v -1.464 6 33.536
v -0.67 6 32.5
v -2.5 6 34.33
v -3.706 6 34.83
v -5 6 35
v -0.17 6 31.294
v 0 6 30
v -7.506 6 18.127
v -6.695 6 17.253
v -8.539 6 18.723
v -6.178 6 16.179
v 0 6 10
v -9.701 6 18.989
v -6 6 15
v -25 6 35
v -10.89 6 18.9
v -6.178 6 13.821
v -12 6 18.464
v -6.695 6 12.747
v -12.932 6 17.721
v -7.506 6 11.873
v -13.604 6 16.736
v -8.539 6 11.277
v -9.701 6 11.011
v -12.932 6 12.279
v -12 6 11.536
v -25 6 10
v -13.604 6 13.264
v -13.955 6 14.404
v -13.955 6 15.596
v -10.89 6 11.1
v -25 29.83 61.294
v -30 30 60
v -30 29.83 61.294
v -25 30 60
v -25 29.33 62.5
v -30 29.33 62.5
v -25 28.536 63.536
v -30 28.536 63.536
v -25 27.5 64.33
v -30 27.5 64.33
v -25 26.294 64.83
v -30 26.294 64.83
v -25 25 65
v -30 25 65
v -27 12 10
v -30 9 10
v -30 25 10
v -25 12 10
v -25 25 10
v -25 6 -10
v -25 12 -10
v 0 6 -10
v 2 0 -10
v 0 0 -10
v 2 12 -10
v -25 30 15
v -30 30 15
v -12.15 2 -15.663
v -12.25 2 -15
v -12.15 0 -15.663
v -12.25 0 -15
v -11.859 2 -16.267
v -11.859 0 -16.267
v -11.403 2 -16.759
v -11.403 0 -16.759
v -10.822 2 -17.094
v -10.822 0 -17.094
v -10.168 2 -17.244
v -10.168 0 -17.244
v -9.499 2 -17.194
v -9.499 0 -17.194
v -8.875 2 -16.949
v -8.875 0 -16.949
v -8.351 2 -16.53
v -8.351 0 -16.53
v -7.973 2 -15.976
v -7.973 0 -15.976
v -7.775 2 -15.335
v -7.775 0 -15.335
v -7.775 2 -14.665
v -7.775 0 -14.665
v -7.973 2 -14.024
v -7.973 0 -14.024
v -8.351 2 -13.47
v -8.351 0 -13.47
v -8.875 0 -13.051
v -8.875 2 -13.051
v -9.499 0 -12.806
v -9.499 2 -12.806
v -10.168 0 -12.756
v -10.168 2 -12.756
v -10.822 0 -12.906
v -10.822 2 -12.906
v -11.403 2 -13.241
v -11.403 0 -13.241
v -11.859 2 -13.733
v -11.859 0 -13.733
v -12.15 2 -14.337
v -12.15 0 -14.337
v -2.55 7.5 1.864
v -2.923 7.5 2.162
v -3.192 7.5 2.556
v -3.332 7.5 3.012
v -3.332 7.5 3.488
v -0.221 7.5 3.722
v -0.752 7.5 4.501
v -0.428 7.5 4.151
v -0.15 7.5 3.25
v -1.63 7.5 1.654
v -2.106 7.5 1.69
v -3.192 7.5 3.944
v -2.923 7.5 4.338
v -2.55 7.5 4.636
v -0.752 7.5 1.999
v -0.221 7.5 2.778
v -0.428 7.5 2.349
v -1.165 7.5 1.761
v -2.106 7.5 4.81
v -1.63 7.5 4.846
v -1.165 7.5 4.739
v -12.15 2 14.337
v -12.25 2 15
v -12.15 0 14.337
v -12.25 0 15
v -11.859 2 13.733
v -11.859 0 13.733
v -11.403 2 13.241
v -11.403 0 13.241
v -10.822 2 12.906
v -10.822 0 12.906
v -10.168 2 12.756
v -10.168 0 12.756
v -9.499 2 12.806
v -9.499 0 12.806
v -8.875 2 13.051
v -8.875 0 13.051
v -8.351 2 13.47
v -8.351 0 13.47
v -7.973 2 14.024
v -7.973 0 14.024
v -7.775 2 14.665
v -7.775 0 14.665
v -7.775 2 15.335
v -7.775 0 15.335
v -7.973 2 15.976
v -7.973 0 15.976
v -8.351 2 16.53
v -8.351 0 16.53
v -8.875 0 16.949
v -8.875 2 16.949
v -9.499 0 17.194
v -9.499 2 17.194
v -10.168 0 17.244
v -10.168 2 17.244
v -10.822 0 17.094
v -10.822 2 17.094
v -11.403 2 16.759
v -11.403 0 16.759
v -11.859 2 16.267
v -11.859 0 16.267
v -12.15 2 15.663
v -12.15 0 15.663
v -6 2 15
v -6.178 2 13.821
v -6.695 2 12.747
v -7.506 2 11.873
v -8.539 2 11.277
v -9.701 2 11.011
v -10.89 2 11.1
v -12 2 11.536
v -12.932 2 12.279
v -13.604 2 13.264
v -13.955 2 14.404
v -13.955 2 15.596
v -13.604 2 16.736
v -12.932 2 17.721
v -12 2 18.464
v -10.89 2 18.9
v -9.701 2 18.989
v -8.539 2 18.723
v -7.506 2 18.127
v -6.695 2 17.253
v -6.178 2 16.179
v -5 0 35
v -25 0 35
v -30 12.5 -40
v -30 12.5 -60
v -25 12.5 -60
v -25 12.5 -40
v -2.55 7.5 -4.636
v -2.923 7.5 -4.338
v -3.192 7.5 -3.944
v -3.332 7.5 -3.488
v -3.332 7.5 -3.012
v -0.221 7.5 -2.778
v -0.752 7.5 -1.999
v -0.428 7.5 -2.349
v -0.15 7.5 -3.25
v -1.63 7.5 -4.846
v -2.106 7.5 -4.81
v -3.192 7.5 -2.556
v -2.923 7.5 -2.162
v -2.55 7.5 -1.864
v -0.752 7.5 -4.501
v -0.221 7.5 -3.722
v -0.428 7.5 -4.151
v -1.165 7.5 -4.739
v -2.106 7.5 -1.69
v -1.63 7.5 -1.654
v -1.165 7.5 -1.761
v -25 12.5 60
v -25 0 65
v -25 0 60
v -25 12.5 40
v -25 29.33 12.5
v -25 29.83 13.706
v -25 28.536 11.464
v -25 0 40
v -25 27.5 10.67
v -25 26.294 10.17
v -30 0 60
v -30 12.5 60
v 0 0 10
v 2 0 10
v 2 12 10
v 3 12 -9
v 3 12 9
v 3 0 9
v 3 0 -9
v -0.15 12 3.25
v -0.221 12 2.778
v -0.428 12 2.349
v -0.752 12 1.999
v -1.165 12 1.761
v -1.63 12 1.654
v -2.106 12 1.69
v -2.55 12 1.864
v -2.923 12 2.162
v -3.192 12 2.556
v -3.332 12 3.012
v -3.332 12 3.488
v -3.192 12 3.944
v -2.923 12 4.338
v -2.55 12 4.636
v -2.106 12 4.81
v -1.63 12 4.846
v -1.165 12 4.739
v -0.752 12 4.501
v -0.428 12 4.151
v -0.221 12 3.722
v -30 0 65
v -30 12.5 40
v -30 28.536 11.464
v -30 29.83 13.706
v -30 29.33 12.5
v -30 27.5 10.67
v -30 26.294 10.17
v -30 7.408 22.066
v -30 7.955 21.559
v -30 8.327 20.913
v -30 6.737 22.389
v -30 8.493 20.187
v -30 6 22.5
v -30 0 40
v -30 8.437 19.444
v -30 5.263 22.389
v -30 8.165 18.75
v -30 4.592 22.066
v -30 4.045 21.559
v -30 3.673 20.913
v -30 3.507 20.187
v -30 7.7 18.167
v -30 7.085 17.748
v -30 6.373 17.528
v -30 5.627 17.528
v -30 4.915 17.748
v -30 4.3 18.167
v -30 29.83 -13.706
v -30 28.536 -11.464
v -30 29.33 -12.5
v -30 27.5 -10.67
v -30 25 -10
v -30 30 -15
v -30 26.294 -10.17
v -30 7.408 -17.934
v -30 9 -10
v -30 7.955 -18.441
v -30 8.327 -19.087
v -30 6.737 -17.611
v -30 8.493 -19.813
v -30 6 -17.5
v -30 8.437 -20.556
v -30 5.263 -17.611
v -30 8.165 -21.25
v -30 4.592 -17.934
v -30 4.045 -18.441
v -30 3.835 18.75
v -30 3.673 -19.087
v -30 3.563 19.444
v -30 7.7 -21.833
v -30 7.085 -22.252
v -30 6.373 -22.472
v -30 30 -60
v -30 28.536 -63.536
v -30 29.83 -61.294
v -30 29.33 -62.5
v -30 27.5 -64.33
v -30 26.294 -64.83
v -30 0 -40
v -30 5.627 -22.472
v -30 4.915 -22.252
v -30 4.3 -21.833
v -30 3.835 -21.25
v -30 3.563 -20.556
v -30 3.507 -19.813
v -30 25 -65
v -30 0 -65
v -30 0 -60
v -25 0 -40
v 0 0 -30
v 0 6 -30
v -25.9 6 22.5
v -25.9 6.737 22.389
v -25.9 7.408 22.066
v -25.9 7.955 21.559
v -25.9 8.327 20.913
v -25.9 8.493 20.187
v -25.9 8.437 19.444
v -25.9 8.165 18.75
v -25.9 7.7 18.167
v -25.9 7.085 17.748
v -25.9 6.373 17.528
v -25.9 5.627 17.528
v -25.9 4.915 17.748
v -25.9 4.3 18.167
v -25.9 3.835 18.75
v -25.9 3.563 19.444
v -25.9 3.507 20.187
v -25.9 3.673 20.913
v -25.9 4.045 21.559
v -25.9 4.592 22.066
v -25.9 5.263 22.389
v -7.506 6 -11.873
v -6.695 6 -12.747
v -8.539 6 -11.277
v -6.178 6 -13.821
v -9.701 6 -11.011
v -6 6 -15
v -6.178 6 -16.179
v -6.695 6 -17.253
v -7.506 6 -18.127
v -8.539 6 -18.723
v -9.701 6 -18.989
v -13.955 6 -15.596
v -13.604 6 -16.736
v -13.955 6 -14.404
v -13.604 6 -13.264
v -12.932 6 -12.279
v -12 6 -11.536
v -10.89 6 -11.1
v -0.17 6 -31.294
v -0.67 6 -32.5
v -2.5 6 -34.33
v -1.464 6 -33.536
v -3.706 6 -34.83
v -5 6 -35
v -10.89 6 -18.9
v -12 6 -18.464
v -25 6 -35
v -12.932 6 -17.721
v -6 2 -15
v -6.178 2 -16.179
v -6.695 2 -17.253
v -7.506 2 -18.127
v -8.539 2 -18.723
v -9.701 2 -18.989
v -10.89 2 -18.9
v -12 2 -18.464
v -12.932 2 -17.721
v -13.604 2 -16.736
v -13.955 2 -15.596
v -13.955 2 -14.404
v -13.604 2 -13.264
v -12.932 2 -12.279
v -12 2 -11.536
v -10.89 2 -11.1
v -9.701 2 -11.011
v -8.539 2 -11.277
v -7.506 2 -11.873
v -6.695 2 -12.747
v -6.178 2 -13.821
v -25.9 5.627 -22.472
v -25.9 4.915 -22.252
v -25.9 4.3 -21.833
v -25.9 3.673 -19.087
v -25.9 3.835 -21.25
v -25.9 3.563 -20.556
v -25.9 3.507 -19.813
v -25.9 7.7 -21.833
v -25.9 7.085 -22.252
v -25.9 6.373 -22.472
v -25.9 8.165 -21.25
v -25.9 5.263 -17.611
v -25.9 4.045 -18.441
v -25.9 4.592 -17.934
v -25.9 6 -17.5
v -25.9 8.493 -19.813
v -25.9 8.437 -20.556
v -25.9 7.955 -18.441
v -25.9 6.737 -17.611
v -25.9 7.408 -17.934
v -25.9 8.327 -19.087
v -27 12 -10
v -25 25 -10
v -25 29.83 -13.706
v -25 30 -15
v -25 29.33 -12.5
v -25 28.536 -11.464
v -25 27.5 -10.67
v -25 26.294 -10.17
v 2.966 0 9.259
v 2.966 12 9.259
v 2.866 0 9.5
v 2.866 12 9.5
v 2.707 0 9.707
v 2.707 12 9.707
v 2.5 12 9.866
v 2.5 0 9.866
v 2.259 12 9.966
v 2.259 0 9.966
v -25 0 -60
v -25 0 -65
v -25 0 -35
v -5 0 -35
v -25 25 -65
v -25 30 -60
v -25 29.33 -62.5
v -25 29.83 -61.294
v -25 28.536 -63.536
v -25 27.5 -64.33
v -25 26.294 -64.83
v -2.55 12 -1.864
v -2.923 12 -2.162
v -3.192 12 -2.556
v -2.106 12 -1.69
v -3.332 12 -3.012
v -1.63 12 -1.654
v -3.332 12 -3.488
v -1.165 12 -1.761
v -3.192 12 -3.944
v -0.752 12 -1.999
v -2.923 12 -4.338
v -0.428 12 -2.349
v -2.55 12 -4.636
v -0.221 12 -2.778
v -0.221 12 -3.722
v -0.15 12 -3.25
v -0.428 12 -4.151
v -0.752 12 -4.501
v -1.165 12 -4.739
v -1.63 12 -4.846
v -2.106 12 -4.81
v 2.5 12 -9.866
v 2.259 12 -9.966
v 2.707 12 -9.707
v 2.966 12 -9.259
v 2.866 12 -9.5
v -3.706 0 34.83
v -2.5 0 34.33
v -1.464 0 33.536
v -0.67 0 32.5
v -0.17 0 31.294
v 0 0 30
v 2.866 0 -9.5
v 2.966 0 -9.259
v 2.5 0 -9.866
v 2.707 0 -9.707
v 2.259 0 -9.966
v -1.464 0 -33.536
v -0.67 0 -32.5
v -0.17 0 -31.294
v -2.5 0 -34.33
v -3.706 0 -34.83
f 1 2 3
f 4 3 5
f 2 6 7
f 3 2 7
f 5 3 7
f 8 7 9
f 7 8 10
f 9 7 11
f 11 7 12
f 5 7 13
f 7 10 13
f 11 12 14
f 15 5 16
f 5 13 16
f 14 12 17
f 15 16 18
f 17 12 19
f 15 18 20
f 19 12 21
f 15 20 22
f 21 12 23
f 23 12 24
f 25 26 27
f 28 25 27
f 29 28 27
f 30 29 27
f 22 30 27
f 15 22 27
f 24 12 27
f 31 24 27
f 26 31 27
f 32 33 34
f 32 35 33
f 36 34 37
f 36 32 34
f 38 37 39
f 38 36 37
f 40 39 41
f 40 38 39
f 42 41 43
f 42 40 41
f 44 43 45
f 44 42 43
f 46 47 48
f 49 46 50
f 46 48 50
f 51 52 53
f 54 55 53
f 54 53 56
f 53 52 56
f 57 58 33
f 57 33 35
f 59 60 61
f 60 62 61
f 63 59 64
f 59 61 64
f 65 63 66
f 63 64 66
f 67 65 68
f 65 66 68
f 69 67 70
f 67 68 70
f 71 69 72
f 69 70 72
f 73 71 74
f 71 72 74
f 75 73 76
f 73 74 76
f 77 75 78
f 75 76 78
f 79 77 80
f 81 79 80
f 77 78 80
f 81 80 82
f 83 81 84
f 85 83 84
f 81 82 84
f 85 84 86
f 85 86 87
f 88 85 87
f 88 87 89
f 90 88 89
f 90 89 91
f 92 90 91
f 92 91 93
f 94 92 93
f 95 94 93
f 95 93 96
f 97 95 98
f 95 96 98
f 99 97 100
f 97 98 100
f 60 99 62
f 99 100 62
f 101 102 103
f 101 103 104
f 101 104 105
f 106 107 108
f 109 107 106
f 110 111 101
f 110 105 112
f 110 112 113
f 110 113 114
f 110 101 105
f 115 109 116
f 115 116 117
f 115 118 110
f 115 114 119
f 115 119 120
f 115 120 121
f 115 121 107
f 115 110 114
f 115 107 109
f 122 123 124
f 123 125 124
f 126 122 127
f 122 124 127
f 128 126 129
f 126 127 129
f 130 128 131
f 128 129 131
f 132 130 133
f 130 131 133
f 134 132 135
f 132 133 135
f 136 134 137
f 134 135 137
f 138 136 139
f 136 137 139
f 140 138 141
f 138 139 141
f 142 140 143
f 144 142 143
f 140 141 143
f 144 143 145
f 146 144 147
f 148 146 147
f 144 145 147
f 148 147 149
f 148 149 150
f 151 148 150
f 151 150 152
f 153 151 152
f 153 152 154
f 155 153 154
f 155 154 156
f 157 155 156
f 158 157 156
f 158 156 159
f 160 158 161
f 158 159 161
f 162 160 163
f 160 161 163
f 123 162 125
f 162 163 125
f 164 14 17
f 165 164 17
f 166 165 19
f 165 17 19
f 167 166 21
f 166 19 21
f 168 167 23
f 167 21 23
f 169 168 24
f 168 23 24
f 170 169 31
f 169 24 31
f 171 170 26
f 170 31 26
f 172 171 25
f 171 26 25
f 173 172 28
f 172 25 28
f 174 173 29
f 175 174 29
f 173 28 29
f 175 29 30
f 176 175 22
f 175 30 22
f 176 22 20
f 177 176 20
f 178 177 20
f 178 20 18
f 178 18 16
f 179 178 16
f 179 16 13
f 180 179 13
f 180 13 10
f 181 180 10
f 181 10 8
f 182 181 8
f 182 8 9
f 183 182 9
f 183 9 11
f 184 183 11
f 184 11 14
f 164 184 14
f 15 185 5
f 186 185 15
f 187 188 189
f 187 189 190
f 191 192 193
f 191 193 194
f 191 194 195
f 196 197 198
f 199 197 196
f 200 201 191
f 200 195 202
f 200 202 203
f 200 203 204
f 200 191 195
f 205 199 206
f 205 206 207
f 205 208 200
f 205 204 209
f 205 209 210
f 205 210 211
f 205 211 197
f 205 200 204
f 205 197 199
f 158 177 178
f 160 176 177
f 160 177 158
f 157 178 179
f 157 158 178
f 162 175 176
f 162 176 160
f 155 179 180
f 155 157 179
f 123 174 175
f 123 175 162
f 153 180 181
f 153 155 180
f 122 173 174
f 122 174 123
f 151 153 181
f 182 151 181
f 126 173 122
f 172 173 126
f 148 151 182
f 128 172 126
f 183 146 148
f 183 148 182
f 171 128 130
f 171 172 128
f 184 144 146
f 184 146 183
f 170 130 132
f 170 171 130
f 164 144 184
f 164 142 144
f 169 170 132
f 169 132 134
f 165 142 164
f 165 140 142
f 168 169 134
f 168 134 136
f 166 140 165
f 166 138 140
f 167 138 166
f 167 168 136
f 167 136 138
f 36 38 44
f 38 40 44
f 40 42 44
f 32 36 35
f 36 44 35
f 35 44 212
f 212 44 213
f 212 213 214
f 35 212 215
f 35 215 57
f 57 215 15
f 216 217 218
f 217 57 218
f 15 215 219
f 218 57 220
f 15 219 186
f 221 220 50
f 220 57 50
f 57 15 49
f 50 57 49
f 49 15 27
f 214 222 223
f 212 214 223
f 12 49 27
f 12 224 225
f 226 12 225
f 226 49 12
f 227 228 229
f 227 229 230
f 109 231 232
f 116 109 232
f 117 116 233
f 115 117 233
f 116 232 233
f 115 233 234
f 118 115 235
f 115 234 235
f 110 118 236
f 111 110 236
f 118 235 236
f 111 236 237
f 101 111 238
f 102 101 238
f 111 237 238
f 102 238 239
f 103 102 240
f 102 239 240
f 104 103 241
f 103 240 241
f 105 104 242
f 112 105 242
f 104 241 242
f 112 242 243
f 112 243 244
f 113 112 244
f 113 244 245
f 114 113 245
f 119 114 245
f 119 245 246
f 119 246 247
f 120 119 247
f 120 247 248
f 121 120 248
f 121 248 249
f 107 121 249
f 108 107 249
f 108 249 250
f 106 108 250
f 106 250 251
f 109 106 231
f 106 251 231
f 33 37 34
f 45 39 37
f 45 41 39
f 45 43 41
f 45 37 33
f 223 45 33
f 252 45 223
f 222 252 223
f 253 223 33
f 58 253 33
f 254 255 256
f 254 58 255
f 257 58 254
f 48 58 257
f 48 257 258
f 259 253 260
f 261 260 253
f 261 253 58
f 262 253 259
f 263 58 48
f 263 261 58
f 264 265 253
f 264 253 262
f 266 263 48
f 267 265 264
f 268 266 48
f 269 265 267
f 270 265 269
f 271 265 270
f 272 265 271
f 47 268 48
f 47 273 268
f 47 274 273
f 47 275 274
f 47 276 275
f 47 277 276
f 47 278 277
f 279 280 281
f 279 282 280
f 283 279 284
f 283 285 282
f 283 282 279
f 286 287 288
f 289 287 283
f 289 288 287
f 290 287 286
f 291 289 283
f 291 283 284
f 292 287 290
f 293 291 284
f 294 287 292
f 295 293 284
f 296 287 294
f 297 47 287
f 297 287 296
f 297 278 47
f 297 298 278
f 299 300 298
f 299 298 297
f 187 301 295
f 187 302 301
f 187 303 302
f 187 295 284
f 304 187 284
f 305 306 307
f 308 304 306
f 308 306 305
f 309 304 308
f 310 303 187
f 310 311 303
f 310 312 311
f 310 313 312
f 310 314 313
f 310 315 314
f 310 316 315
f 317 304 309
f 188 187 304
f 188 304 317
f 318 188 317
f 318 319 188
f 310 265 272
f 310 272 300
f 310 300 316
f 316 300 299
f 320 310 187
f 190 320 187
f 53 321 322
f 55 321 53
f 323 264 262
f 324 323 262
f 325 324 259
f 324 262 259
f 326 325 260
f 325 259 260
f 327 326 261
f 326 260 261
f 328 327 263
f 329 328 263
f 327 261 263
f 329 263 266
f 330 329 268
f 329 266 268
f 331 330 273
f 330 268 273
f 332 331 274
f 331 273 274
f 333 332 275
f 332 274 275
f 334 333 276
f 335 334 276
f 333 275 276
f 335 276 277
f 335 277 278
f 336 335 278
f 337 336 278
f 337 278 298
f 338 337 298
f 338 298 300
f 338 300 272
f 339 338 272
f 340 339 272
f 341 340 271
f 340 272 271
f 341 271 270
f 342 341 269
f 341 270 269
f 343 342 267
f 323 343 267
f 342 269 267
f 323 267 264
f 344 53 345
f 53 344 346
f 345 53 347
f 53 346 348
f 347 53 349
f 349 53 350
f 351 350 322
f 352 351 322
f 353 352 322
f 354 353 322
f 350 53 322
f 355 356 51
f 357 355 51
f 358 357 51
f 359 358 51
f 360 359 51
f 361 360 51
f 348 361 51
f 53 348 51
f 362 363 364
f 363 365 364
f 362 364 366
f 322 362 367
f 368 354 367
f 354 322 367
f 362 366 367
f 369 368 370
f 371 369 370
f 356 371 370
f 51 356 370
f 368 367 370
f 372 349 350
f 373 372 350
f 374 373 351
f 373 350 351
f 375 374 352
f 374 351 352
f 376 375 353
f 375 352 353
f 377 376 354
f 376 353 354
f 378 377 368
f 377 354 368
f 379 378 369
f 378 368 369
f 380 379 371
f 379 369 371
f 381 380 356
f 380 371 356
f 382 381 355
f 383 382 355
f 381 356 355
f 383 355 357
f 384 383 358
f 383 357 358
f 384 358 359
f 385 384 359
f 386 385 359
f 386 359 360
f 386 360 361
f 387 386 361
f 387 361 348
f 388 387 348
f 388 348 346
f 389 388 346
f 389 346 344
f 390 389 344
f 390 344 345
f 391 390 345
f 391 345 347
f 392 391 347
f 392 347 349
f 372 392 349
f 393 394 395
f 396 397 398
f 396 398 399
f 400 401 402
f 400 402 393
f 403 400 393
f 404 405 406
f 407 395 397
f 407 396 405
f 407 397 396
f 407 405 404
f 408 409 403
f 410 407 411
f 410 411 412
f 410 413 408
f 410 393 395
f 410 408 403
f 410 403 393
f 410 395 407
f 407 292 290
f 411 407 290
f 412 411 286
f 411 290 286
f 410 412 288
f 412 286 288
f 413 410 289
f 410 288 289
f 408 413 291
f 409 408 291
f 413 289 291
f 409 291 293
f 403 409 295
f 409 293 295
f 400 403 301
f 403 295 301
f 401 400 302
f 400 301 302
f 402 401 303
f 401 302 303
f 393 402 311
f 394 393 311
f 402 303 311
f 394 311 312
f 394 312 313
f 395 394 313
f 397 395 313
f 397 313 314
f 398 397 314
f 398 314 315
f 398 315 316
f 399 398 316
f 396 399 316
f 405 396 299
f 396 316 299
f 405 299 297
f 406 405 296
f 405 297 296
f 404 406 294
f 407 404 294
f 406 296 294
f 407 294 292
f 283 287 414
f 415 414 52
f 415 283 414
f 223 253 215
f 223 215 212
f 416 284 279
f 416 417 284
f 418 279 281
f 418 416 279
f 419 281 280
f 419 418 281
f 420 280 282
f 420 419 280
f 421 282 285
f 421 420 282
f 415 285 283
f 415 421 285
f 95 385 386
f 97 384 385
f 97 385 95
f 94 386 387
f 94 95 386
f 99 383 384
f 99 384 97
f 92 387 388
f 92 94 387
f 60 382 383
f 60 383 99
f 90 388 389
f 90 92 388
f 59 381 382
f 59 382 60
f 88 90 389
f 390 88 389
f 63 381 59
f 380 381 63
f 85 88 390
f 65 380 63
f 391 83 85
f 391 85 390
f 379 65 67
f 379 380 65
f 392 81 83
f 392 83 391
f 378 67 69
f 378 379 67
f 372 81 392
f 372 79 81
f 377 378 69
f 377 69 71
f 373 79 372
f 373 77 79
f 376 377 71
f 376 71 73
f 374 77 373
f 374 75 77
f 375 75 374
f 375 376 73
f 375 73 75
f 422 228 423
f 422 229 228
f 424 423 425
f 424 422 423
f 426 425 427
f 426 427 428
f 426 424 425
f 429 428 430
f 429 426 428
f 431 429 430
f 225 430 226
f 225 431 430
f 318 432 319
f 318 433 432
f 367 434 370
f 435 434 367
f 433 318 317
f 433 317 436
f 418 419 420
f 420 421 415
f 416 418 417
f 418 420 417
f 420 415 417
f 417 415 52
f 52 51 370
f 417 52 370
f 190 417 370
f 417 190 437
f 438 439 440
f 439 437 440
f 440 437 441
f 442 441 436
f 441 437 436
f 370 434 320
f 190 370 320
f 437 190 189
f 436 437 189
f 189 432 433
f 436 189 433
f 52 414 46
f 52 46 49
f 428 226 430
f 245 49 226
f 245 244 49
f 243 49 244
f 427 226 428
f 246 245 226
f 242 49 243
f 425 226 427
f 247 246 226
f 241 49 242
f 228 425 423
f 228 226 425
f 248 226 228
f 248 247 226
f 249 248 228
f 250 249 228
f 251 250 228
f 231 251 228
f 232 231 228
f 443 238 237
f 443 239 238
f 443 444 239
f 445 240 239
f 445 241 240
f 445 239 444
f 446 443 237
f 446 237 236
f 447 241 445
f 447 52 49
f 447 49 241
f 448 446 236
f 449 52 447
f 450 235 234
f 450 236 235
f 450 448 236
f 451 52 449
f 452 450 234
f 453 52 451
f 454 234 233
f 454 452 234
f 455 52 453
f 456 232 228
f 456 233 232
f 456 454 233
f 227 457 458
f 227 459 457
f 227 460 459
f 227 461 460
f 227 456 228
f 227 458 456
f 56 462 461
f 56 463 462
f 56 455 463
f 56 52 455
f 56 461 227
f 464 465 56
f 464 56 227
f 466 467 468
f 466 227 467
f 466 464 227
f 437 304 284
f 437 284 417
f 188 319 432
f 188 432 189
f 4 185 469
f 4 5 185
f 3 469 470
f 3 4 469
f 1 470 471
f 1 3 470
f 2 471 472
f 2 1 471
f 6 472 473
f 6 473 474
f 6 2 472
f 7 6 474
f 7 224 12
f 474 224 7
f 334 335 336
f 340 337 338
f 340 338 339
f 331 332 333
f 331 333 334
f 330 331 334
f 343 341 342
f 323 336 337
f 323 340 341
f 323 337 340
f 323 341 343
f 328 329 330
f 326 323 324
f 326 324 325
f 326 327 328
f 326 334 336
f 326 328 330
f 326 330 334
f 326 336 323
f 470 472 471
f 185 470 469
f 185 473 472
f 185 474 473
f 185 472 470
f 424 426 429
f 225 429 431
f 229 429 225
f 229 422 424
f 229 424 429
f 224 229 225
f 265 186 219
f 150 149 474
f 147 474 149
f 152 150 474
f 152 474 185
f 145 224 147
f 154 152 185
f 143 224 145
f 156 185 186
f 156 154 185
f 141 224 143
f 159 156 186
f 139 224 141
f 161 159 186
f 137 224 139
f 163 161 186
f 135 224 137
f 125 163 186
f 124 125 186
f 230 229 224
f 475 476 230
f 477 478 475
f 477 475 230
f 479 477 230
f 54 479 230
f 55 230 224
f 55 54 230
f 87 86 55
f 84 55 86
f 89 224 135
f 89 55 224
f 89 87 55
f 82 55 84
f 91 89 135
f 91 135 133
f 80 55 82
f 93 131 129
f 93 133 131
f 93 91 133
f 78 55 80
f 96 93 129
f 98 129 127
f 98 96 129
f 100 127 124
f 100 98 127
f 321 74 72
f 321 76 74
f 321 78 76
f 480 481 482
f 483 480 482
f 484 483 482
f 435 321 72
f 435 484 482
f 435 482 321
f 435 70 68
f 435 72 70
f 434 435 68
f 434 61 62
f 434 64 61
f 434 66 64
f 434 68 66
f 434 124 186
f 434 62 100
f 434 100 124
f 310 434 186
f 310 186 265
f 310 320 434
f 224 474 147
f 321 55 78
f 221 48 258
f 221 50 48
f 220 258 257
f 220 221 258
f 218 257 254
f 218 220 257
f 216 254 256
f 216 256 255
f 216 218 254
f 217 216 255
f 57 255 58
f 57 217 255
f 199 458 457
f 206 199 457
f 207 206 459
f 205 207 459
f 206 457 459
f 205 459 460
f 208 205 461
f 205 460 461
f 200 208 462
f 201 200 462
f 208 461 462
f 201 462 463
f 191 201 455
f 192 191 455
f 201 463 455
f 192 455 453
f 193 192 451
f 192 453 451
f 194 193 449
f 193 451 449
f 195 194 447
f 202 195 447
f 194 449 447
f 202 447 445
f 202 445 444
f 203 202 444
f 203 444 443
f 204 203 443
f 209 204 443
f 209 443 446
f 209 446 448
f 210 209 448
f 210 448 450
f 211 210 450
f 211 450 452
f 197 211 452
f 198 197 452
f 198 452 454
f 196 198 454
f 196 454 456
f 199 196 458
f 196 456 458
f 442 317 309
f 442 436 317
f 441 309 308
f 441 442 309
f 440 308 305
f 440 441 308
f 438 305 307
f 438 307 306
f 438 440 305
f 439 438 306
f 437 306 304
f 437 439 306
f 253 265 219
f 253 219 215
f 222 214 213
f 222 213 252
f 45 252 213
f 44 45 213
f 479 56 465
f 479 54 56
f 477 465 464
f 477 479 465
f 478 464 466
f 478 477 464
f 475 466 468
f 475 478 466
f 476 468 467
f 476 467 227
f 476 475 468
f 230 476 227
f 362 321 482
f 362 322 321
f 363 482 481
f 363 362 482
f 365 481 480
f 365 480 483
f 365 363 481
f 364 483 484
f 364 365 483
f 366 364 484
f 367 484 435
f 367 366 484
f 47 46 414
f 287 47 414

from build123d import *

# Parameters (mm, degrees)
BOSS_EXTRUDE1_DEPTH            = 6
SKETCH2_W                      = 5
SKETCH2_H                      = 130
BOSS_EXTRUDE2_DEPTH            = 24
SKETCH3_W                      = 20
SKETCH3_H                      = 12.5
CUT_EXTRUDE1_DEPTH             = 31
CBORE_FOR_M4_SHCS1_D           = 4.5
CBORE_FOR_M4_SHCS1_CBORE_D     = 8
CBORE_FOR_M4_SHCS1_CBORE_DEPTH = 4
SKETCH9_W                      = 5
SKETCH9_H                      = 20
CUT_EXTRUDE2_DEPTH             = 18
SKETCH10_W                     = 33
SKETCH10_H                     = 20
BOSS_EXTRUDE3_DEPTH            = 12
FILLET1_R                      = 5
SKETCH13_R                     = 2.5
CUT_EXTRUDE3_DEPTH             = 4.1
CHAMFER1_SIZE                  = 3
SKETCH11_R                     = 1.6
CUT_EXTRUDE4_DEPTH             = 4.5
FILLET3_R                      = 1


with BuildPart() as part:
    # Sketch1 → Boss-Extrude1 (new body)
    with BuildSketch(Plane(origin=(0, 0, 0), x_dir=(1, 0, 0), z_dir=(0, 1, 0))):
        Polygon((-25, -35), (-25, -65), (-30, -65), (-30, 65), (-25, 65), (-25, 35), (0, 35), (0, -35), align=None)
    extrude(amount=BOSS_EXTRUDE1_DEPTH)

    # Sketch2 → Boss-Extrude2 (add)
    with BuildSketch(Plane(origin=(0, 6, 0), x_dir=(1, 0, 0), z_dir=(0, 1, 0))):
        with Locations((-27.5, 0)):
            Rectangle(SKETCH2_W, SKETCH2_H)
    extrude(amount=BOSS_EXTRUDE2_DEPTH)

    # Sketch3 → Cut-Extrude1 (cut, through all)
    with BuildSketch(Plane.ZY.offset(30)):
        with Locations((-50, 6.25)):
            Rectangle(SKETCH3_W, SKETCH3_H)
        with Locations((50, 6.25)):
            Rectangle(SKETCH3_W, SKETCH3_H)
    extrude(amount=-CUT_EXTRUDE1_DEPTH, mode=Mode.SUBTRACT)

    # CBORE for M4 SHCS1 (through all)
    with Locations(Plane(origin=(0, 6, 0), x_dir=(1, 0, 0), z_dir=(0, 1, 0))):
        with Locations((-10, 15), (-10, -15)):
            CounterBoreHole(CBORE_FOR_M4_SHCS1_D / 2, CBORE_FOR_M4_SHCS1_CBORE_D / 2, CBORE_FOR_M4_SHCS1_CBORE_DEPTH)

    # Sketch9 → Cut-Extrude2 (cut)
    with BuildSketch(Plane(origin=(0, 30, 0), x_dir=(1, 0, 0), z_dir=(0, 1, 0))):
        with Locations((-27.5, 0)):
            Rectangle(SKETCH9_W, SKETCH9_H)
    extrude(amount=-CUT_EXTRUDE2_DEPTH, mode=Mode.SUBTRACT)

    # Sketch10 → Boss-Extrude3 (add, through all)
    with BuildSketch(Plane(origin=(0, 12, 0), x_dir=(1, 0, 0), z_dir=(0, 1, 0))):
        with Locations((-13.5, 0)):
            Rectangle(SKETCH10_W, SKETCH10_H)
    extrude(amount=-BOSS_EXTRUDE3_DEPTH)

    # Fillet1
    fillet1_edges = [part.edges().sort_by_distance(p)[0] for p in [
        (-27.5, 30, 10),
        (-27.5, 30, -10),
        (0, 3, -35),
        (0, 3, 35),
        (-27.5, 30, 65),
        (-27.5, 30, -65),
    ]]
    fillet(fillet1_edges, radius=FILLET1_R)

    # Sketch13 → Cut-Extrude3 (cut)
    with BuildSketch(Plane.ZY.offset(30)):
        with Locations((-20, 6)):
            Circle(SKETCH13_R)
        with Locations((20, 6)):
            Circle(SKETCH13_R)
    extrude(amount=-CUT_EXTRUDE3_DEPTH, mode=Mode.SUBTRACT)

    # Chamfer1
    chamfer1_edges = [part.edges().sort_by_distance(p)[0] for p in [
        (-30, 12, 0),
    ]]
    chamfer(chamfer1_edges, length=CHAMFER1_SIZE)

    # Sketch11 → Cut-Extrude4 (cut)
    with BuildSketch(Plane(origin=(0, 12, 0), x_dir=(1, 0, 0), z_dir=(0, 1, 0))):
        with Locations((-1.75, 3.25)):
            Circle(SKETCH11_R)
        with Locations((-1.75, -3.25)):
            Circle(SKETCH11_R)
    extrude(amount=-CUT_EXTRUDE4_DEPTH, mode=Mode.SUBTRACT)

    # Fillet3
    fillet3_edges = [part.edges().sort_by_distance(p)[0] for p in [
        (3, 6, 10),
        (3, 6, -10),
    ]]
    fillet(fillet3_edges, radius=FILLET3_R)


solid = part.part
